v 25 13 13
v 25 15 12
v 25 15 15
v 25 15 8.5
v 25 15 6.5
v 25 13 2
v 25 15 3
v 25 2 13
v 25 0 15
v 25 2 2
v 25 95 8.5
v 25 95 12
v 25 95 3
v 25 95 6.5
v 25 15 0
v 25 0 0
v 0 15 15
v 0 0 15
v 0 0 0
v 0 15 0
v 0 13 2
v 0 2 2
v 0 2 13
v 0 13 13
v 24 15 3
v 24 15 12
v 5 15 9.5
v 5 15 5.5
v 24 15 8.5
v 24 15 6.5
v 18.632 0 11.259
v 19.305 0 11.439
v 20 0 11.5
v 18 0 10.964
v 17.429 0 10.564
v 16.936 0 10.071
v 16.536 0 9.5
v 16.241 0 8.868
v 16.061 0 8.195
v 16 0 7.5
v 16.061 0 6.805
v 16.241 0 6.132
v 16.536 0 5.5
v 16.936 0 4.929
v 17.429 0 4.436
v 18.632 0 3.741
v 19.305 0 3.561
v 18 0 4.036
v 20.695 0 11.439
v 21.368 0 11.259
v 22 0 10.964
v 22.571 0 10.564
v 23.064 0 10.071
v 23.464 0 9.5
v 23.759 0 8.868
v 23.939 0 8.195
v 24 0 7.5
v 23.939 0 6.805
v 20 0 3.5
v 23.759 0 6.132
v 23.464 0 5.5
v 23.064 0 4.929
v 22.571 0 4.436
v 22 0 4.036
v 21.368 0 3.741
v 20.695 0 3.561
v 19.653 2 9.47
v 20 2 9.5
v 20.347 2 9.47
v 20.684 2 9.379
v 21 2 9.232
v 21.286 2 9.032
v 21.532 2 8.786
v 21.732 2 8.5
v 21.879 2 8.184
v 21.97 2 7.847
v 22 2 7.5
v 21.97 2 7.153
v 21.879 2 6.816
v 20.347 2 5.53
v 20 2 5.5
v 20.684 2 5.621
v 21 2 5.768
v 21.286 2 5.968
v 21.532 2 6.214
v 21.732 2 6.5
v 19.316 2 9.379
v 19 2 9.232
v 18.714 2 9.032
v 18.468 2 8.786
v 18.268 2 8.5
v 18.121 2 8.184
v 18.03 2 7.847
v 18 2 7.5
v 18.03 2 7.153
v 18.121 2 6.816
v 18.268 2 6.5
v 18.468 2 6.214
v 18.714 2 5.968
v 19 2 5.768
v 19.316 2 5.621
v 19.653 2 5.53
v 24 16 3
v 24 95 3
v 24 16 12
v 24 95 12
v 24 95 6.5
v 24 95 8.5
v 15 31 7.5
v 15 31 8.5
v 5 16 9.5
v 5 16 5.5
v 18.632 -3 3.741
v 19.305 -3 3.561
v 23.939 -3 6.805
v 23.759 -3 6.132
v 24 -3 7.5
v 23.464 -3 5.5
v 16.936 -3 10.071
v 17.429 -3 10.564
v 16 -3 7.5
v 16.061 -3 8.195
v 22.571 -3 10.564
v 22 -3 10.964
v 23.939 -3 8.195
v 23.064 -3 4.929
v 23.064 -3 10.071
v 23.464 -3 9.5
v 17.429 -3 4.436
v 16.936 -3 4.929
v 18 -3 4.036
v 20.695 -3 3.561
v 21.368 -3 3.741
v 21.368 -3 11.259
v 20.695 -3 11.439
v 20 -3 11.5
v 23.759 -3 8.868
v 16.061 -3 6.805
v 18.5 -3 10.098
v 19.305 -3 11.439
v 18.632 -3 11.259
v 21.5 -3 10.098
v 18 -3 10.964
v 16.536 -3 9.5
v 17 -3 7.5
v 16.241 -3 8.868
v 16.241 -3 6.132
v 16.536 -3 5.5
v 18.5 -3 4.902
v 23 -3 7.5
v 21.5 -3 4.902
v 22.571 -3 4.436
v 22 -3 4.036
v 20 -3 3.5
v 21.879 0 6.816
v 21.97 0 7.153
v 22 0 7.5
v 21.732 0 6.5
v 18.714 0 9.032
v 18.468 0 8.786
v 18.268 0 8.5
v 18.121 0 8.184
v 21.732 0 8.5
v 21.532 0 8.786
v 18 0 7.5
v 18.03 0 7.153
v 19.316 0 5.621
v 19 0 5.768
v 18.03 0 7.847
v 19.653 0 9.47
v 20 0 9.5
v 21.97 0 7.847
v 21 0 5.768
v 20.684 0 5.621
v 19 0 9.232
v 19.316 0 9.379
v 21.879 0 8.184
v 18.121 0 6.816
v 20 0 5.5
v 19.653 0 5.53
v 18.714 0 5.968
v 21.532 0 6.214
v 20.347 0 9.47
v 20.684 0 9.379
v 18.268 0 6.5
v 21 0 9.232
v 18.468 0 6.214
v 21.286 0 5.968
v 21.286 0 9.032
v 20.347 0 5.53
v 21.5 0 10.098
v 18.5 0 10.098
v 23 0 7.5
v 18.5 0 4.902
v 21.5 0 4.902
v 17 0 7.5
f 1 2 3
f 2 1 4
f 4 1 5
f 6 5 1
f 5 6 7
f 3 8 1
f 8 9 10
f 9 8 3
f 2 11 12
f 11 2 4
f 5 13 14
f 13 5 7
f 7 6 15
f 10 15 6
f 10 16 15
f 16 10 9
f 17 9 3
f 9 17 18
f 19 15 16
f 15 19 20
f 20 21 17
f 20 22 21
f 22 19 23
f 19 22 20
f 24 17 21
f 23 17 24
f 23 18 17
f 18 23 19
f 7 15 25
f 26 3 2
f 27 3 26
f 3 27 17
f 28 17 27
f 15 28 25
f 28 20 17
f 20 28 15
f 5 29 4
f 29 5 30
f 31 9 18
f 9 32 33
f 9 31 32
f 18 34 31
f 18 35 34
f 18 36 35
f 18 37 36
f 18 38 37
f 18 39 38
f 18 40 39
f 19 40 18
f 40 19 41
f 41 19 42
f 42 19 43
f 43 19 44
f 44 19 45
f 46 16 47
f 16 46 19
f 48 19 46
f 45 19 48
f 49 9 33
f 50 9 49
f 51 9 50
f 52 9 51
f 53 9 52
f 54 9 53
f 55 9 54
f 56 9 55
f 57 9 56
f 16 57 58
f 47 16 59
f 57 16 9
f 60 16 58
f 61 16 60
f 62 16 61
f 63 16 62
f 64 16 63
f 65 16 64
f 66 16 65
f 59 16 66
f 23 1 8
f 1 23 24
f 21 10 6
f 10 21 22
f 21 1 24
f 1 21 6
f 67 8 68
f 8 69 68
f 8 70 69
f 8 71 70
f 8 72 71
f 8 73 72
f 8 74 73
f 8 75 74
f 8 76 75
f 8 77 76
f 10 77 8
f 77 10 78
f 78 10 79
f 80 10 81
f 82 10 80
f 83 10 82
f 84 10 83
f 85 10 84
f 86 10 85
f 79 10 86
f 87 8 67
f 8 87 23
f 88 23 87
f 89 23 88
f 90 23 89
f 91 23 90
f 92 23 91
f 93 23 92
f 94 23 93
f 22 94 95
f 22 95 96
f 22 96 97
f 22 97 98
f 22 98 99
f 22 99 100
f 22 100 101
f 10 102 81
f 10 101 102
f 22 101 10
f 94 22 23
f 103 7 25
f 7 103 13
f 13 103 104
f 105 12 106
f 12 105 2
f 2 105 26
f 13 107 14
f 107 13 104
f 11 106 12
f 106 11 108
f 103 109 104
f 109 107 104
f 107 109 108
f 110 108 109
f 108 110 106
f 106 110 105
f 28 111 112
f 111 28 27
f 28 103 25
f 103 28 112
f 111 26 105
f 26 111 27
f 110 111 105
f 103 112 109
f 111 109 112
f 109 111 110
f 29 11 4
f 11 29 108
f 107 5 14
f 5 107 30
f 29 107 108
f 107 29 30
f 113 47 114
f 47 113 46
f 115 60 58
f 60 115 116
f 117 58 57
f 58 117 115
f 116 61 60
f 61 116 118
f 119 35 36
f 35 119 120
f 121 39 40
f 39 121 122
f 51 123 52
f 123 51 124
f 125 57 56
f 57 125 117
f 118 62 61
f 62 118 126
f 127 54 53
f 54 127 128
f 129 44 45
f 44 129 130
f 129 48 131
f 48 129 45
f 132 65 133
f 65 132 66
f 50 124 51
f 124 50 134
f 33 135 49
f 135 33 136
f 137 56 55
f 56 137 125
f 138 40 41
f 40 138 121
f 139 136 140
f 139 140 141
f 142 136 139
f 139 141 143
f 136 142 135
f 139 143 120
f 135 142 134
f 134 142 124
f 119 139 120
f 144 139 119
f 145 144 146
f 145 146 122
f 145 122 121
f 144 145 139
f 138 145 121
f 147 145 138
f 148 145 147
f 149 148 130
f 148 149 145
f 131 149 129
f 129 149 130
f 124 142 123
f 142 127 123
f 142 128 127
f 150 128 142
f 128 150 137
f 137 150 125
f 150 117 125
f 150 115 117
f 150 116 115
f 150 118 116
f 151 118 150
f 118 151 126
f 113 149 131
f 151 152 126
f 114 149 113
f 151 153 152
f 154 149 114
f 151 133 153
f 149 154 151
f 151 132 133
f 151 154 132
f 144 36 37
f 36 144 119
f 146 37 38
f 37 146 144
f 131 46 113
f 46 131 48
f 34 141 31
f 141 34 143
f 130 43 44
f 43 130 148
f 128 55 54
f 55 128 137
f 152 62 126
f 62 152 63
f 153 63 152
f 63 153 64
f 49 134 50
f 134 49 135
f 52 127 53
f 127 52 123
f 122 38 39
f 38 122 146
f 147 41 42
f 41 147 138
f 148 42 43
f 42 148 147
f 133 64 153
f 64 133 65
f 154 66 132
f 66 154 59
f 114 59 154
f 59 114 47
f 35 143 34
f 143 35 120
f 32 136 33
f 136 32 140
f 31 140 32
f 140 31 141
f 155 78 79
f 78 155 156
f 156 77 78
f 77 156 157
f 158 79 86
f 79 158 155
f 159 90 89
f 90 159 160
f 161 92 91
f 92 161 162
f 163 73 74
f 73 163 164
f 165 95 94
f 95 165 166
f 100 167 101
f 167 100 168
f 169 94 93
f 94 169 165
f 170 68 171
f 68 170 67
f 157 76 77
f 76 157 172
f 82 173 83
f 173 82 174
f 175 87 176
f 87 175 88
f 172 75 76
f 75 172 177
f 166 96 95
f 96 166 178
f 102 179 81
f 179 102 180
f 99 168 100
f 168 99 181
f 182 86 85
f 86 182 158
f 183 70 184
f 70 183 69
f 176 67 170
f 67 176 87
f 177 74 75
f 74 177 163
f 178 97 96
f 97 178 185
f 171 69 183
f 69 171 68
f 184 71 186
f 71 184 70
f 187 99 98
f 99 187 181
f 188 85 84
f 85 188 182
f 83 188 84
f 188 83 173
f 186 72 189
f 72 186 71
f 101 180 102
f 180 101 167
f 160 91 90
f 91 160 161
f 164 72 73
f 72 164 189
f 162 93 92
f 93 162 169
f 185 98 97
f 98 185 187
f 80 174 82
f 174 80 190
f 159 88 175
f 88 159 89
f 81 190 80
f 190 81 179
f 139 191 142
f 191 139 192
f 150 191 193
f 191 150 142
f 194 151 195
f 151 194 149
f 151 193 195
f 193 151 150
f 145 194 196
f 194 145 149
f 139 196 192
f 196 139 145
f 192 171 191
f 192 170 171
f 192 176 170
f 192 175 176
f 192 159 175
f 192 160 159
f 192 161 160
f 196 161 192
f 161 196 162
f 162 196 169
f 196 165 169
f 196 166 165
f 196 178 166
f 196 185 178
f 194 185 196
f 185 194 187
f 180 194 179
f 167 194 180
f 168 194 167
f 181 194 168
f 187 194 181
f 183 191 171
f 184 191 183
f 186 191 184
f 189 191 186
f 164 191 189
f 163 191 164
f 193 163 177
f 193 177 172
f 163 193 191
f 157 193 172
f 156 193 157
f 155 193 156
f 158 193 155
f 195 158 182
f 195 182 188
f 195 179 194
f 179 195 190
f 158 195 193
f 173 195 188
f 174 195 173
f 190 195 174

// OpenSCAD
//PCB vice V1.0
//
//0.5mm total tolerance for slide shaft
//slide shaft is 10x10mm
tolerance = 1;
ht = tolerance/2;
shaftWidth = 10 + tolerance;
nutWidth = 6;
difference()
{
union()
{
    difference()
    {
        //box for the slide`
        cube([25, 15, 15]);
        //shaft cutout

        translate([0, 2.5-ht,2.5-ht])cube([25, shaftWidth, shaftWidth ]);
    }

    //----------------------------------------------CLAMP
    difference()
    {
        union()
        {
            hull()
            {
                hull()
                {
                    
                    translate([24, 15, 3]) cube([1, 80, 1]);
                    translate([24, 94, 5]) cube([1, 1, 1]);
                    translate([24, 15, 11]) cube([1, 1, 1]);
                    translate([24, 94, 11]) cube([1, 1, 1]);
                }
                translate([15, 30, 7.5]) cube([1, 1, 1]);
            }
            hull()
            {
                translate([15, 30, 7.5]) cube([1, 1, 1]);
                translate([5, 15, 5.5]) cube([1, 1, 4]);
                translate([24, 15, 3]) cube([1, 1, 1]);
                translate([24, 15, 11]) cube([1, 1, 1]);
            }
        }
        //cut for pcb
        translate([24, 15, 6.5]) cube([1, 80, 2]);
    }
    //base for nut
    translate([20, -3, 7.5]) rotate([-90, 0, 0]) cylinder(h=3, r=4, $fn = 36);
}

//nut mount and screw hole
translate([20, -3, 7.5]) rotate([-90, 0, 0]) cylinder(h=6, r=2, $fn = 36);
translate([20, -3, 7.5]) rotate([-90, 0, 0]) cylinder(h=3, d=6, $fn = 6);
}
